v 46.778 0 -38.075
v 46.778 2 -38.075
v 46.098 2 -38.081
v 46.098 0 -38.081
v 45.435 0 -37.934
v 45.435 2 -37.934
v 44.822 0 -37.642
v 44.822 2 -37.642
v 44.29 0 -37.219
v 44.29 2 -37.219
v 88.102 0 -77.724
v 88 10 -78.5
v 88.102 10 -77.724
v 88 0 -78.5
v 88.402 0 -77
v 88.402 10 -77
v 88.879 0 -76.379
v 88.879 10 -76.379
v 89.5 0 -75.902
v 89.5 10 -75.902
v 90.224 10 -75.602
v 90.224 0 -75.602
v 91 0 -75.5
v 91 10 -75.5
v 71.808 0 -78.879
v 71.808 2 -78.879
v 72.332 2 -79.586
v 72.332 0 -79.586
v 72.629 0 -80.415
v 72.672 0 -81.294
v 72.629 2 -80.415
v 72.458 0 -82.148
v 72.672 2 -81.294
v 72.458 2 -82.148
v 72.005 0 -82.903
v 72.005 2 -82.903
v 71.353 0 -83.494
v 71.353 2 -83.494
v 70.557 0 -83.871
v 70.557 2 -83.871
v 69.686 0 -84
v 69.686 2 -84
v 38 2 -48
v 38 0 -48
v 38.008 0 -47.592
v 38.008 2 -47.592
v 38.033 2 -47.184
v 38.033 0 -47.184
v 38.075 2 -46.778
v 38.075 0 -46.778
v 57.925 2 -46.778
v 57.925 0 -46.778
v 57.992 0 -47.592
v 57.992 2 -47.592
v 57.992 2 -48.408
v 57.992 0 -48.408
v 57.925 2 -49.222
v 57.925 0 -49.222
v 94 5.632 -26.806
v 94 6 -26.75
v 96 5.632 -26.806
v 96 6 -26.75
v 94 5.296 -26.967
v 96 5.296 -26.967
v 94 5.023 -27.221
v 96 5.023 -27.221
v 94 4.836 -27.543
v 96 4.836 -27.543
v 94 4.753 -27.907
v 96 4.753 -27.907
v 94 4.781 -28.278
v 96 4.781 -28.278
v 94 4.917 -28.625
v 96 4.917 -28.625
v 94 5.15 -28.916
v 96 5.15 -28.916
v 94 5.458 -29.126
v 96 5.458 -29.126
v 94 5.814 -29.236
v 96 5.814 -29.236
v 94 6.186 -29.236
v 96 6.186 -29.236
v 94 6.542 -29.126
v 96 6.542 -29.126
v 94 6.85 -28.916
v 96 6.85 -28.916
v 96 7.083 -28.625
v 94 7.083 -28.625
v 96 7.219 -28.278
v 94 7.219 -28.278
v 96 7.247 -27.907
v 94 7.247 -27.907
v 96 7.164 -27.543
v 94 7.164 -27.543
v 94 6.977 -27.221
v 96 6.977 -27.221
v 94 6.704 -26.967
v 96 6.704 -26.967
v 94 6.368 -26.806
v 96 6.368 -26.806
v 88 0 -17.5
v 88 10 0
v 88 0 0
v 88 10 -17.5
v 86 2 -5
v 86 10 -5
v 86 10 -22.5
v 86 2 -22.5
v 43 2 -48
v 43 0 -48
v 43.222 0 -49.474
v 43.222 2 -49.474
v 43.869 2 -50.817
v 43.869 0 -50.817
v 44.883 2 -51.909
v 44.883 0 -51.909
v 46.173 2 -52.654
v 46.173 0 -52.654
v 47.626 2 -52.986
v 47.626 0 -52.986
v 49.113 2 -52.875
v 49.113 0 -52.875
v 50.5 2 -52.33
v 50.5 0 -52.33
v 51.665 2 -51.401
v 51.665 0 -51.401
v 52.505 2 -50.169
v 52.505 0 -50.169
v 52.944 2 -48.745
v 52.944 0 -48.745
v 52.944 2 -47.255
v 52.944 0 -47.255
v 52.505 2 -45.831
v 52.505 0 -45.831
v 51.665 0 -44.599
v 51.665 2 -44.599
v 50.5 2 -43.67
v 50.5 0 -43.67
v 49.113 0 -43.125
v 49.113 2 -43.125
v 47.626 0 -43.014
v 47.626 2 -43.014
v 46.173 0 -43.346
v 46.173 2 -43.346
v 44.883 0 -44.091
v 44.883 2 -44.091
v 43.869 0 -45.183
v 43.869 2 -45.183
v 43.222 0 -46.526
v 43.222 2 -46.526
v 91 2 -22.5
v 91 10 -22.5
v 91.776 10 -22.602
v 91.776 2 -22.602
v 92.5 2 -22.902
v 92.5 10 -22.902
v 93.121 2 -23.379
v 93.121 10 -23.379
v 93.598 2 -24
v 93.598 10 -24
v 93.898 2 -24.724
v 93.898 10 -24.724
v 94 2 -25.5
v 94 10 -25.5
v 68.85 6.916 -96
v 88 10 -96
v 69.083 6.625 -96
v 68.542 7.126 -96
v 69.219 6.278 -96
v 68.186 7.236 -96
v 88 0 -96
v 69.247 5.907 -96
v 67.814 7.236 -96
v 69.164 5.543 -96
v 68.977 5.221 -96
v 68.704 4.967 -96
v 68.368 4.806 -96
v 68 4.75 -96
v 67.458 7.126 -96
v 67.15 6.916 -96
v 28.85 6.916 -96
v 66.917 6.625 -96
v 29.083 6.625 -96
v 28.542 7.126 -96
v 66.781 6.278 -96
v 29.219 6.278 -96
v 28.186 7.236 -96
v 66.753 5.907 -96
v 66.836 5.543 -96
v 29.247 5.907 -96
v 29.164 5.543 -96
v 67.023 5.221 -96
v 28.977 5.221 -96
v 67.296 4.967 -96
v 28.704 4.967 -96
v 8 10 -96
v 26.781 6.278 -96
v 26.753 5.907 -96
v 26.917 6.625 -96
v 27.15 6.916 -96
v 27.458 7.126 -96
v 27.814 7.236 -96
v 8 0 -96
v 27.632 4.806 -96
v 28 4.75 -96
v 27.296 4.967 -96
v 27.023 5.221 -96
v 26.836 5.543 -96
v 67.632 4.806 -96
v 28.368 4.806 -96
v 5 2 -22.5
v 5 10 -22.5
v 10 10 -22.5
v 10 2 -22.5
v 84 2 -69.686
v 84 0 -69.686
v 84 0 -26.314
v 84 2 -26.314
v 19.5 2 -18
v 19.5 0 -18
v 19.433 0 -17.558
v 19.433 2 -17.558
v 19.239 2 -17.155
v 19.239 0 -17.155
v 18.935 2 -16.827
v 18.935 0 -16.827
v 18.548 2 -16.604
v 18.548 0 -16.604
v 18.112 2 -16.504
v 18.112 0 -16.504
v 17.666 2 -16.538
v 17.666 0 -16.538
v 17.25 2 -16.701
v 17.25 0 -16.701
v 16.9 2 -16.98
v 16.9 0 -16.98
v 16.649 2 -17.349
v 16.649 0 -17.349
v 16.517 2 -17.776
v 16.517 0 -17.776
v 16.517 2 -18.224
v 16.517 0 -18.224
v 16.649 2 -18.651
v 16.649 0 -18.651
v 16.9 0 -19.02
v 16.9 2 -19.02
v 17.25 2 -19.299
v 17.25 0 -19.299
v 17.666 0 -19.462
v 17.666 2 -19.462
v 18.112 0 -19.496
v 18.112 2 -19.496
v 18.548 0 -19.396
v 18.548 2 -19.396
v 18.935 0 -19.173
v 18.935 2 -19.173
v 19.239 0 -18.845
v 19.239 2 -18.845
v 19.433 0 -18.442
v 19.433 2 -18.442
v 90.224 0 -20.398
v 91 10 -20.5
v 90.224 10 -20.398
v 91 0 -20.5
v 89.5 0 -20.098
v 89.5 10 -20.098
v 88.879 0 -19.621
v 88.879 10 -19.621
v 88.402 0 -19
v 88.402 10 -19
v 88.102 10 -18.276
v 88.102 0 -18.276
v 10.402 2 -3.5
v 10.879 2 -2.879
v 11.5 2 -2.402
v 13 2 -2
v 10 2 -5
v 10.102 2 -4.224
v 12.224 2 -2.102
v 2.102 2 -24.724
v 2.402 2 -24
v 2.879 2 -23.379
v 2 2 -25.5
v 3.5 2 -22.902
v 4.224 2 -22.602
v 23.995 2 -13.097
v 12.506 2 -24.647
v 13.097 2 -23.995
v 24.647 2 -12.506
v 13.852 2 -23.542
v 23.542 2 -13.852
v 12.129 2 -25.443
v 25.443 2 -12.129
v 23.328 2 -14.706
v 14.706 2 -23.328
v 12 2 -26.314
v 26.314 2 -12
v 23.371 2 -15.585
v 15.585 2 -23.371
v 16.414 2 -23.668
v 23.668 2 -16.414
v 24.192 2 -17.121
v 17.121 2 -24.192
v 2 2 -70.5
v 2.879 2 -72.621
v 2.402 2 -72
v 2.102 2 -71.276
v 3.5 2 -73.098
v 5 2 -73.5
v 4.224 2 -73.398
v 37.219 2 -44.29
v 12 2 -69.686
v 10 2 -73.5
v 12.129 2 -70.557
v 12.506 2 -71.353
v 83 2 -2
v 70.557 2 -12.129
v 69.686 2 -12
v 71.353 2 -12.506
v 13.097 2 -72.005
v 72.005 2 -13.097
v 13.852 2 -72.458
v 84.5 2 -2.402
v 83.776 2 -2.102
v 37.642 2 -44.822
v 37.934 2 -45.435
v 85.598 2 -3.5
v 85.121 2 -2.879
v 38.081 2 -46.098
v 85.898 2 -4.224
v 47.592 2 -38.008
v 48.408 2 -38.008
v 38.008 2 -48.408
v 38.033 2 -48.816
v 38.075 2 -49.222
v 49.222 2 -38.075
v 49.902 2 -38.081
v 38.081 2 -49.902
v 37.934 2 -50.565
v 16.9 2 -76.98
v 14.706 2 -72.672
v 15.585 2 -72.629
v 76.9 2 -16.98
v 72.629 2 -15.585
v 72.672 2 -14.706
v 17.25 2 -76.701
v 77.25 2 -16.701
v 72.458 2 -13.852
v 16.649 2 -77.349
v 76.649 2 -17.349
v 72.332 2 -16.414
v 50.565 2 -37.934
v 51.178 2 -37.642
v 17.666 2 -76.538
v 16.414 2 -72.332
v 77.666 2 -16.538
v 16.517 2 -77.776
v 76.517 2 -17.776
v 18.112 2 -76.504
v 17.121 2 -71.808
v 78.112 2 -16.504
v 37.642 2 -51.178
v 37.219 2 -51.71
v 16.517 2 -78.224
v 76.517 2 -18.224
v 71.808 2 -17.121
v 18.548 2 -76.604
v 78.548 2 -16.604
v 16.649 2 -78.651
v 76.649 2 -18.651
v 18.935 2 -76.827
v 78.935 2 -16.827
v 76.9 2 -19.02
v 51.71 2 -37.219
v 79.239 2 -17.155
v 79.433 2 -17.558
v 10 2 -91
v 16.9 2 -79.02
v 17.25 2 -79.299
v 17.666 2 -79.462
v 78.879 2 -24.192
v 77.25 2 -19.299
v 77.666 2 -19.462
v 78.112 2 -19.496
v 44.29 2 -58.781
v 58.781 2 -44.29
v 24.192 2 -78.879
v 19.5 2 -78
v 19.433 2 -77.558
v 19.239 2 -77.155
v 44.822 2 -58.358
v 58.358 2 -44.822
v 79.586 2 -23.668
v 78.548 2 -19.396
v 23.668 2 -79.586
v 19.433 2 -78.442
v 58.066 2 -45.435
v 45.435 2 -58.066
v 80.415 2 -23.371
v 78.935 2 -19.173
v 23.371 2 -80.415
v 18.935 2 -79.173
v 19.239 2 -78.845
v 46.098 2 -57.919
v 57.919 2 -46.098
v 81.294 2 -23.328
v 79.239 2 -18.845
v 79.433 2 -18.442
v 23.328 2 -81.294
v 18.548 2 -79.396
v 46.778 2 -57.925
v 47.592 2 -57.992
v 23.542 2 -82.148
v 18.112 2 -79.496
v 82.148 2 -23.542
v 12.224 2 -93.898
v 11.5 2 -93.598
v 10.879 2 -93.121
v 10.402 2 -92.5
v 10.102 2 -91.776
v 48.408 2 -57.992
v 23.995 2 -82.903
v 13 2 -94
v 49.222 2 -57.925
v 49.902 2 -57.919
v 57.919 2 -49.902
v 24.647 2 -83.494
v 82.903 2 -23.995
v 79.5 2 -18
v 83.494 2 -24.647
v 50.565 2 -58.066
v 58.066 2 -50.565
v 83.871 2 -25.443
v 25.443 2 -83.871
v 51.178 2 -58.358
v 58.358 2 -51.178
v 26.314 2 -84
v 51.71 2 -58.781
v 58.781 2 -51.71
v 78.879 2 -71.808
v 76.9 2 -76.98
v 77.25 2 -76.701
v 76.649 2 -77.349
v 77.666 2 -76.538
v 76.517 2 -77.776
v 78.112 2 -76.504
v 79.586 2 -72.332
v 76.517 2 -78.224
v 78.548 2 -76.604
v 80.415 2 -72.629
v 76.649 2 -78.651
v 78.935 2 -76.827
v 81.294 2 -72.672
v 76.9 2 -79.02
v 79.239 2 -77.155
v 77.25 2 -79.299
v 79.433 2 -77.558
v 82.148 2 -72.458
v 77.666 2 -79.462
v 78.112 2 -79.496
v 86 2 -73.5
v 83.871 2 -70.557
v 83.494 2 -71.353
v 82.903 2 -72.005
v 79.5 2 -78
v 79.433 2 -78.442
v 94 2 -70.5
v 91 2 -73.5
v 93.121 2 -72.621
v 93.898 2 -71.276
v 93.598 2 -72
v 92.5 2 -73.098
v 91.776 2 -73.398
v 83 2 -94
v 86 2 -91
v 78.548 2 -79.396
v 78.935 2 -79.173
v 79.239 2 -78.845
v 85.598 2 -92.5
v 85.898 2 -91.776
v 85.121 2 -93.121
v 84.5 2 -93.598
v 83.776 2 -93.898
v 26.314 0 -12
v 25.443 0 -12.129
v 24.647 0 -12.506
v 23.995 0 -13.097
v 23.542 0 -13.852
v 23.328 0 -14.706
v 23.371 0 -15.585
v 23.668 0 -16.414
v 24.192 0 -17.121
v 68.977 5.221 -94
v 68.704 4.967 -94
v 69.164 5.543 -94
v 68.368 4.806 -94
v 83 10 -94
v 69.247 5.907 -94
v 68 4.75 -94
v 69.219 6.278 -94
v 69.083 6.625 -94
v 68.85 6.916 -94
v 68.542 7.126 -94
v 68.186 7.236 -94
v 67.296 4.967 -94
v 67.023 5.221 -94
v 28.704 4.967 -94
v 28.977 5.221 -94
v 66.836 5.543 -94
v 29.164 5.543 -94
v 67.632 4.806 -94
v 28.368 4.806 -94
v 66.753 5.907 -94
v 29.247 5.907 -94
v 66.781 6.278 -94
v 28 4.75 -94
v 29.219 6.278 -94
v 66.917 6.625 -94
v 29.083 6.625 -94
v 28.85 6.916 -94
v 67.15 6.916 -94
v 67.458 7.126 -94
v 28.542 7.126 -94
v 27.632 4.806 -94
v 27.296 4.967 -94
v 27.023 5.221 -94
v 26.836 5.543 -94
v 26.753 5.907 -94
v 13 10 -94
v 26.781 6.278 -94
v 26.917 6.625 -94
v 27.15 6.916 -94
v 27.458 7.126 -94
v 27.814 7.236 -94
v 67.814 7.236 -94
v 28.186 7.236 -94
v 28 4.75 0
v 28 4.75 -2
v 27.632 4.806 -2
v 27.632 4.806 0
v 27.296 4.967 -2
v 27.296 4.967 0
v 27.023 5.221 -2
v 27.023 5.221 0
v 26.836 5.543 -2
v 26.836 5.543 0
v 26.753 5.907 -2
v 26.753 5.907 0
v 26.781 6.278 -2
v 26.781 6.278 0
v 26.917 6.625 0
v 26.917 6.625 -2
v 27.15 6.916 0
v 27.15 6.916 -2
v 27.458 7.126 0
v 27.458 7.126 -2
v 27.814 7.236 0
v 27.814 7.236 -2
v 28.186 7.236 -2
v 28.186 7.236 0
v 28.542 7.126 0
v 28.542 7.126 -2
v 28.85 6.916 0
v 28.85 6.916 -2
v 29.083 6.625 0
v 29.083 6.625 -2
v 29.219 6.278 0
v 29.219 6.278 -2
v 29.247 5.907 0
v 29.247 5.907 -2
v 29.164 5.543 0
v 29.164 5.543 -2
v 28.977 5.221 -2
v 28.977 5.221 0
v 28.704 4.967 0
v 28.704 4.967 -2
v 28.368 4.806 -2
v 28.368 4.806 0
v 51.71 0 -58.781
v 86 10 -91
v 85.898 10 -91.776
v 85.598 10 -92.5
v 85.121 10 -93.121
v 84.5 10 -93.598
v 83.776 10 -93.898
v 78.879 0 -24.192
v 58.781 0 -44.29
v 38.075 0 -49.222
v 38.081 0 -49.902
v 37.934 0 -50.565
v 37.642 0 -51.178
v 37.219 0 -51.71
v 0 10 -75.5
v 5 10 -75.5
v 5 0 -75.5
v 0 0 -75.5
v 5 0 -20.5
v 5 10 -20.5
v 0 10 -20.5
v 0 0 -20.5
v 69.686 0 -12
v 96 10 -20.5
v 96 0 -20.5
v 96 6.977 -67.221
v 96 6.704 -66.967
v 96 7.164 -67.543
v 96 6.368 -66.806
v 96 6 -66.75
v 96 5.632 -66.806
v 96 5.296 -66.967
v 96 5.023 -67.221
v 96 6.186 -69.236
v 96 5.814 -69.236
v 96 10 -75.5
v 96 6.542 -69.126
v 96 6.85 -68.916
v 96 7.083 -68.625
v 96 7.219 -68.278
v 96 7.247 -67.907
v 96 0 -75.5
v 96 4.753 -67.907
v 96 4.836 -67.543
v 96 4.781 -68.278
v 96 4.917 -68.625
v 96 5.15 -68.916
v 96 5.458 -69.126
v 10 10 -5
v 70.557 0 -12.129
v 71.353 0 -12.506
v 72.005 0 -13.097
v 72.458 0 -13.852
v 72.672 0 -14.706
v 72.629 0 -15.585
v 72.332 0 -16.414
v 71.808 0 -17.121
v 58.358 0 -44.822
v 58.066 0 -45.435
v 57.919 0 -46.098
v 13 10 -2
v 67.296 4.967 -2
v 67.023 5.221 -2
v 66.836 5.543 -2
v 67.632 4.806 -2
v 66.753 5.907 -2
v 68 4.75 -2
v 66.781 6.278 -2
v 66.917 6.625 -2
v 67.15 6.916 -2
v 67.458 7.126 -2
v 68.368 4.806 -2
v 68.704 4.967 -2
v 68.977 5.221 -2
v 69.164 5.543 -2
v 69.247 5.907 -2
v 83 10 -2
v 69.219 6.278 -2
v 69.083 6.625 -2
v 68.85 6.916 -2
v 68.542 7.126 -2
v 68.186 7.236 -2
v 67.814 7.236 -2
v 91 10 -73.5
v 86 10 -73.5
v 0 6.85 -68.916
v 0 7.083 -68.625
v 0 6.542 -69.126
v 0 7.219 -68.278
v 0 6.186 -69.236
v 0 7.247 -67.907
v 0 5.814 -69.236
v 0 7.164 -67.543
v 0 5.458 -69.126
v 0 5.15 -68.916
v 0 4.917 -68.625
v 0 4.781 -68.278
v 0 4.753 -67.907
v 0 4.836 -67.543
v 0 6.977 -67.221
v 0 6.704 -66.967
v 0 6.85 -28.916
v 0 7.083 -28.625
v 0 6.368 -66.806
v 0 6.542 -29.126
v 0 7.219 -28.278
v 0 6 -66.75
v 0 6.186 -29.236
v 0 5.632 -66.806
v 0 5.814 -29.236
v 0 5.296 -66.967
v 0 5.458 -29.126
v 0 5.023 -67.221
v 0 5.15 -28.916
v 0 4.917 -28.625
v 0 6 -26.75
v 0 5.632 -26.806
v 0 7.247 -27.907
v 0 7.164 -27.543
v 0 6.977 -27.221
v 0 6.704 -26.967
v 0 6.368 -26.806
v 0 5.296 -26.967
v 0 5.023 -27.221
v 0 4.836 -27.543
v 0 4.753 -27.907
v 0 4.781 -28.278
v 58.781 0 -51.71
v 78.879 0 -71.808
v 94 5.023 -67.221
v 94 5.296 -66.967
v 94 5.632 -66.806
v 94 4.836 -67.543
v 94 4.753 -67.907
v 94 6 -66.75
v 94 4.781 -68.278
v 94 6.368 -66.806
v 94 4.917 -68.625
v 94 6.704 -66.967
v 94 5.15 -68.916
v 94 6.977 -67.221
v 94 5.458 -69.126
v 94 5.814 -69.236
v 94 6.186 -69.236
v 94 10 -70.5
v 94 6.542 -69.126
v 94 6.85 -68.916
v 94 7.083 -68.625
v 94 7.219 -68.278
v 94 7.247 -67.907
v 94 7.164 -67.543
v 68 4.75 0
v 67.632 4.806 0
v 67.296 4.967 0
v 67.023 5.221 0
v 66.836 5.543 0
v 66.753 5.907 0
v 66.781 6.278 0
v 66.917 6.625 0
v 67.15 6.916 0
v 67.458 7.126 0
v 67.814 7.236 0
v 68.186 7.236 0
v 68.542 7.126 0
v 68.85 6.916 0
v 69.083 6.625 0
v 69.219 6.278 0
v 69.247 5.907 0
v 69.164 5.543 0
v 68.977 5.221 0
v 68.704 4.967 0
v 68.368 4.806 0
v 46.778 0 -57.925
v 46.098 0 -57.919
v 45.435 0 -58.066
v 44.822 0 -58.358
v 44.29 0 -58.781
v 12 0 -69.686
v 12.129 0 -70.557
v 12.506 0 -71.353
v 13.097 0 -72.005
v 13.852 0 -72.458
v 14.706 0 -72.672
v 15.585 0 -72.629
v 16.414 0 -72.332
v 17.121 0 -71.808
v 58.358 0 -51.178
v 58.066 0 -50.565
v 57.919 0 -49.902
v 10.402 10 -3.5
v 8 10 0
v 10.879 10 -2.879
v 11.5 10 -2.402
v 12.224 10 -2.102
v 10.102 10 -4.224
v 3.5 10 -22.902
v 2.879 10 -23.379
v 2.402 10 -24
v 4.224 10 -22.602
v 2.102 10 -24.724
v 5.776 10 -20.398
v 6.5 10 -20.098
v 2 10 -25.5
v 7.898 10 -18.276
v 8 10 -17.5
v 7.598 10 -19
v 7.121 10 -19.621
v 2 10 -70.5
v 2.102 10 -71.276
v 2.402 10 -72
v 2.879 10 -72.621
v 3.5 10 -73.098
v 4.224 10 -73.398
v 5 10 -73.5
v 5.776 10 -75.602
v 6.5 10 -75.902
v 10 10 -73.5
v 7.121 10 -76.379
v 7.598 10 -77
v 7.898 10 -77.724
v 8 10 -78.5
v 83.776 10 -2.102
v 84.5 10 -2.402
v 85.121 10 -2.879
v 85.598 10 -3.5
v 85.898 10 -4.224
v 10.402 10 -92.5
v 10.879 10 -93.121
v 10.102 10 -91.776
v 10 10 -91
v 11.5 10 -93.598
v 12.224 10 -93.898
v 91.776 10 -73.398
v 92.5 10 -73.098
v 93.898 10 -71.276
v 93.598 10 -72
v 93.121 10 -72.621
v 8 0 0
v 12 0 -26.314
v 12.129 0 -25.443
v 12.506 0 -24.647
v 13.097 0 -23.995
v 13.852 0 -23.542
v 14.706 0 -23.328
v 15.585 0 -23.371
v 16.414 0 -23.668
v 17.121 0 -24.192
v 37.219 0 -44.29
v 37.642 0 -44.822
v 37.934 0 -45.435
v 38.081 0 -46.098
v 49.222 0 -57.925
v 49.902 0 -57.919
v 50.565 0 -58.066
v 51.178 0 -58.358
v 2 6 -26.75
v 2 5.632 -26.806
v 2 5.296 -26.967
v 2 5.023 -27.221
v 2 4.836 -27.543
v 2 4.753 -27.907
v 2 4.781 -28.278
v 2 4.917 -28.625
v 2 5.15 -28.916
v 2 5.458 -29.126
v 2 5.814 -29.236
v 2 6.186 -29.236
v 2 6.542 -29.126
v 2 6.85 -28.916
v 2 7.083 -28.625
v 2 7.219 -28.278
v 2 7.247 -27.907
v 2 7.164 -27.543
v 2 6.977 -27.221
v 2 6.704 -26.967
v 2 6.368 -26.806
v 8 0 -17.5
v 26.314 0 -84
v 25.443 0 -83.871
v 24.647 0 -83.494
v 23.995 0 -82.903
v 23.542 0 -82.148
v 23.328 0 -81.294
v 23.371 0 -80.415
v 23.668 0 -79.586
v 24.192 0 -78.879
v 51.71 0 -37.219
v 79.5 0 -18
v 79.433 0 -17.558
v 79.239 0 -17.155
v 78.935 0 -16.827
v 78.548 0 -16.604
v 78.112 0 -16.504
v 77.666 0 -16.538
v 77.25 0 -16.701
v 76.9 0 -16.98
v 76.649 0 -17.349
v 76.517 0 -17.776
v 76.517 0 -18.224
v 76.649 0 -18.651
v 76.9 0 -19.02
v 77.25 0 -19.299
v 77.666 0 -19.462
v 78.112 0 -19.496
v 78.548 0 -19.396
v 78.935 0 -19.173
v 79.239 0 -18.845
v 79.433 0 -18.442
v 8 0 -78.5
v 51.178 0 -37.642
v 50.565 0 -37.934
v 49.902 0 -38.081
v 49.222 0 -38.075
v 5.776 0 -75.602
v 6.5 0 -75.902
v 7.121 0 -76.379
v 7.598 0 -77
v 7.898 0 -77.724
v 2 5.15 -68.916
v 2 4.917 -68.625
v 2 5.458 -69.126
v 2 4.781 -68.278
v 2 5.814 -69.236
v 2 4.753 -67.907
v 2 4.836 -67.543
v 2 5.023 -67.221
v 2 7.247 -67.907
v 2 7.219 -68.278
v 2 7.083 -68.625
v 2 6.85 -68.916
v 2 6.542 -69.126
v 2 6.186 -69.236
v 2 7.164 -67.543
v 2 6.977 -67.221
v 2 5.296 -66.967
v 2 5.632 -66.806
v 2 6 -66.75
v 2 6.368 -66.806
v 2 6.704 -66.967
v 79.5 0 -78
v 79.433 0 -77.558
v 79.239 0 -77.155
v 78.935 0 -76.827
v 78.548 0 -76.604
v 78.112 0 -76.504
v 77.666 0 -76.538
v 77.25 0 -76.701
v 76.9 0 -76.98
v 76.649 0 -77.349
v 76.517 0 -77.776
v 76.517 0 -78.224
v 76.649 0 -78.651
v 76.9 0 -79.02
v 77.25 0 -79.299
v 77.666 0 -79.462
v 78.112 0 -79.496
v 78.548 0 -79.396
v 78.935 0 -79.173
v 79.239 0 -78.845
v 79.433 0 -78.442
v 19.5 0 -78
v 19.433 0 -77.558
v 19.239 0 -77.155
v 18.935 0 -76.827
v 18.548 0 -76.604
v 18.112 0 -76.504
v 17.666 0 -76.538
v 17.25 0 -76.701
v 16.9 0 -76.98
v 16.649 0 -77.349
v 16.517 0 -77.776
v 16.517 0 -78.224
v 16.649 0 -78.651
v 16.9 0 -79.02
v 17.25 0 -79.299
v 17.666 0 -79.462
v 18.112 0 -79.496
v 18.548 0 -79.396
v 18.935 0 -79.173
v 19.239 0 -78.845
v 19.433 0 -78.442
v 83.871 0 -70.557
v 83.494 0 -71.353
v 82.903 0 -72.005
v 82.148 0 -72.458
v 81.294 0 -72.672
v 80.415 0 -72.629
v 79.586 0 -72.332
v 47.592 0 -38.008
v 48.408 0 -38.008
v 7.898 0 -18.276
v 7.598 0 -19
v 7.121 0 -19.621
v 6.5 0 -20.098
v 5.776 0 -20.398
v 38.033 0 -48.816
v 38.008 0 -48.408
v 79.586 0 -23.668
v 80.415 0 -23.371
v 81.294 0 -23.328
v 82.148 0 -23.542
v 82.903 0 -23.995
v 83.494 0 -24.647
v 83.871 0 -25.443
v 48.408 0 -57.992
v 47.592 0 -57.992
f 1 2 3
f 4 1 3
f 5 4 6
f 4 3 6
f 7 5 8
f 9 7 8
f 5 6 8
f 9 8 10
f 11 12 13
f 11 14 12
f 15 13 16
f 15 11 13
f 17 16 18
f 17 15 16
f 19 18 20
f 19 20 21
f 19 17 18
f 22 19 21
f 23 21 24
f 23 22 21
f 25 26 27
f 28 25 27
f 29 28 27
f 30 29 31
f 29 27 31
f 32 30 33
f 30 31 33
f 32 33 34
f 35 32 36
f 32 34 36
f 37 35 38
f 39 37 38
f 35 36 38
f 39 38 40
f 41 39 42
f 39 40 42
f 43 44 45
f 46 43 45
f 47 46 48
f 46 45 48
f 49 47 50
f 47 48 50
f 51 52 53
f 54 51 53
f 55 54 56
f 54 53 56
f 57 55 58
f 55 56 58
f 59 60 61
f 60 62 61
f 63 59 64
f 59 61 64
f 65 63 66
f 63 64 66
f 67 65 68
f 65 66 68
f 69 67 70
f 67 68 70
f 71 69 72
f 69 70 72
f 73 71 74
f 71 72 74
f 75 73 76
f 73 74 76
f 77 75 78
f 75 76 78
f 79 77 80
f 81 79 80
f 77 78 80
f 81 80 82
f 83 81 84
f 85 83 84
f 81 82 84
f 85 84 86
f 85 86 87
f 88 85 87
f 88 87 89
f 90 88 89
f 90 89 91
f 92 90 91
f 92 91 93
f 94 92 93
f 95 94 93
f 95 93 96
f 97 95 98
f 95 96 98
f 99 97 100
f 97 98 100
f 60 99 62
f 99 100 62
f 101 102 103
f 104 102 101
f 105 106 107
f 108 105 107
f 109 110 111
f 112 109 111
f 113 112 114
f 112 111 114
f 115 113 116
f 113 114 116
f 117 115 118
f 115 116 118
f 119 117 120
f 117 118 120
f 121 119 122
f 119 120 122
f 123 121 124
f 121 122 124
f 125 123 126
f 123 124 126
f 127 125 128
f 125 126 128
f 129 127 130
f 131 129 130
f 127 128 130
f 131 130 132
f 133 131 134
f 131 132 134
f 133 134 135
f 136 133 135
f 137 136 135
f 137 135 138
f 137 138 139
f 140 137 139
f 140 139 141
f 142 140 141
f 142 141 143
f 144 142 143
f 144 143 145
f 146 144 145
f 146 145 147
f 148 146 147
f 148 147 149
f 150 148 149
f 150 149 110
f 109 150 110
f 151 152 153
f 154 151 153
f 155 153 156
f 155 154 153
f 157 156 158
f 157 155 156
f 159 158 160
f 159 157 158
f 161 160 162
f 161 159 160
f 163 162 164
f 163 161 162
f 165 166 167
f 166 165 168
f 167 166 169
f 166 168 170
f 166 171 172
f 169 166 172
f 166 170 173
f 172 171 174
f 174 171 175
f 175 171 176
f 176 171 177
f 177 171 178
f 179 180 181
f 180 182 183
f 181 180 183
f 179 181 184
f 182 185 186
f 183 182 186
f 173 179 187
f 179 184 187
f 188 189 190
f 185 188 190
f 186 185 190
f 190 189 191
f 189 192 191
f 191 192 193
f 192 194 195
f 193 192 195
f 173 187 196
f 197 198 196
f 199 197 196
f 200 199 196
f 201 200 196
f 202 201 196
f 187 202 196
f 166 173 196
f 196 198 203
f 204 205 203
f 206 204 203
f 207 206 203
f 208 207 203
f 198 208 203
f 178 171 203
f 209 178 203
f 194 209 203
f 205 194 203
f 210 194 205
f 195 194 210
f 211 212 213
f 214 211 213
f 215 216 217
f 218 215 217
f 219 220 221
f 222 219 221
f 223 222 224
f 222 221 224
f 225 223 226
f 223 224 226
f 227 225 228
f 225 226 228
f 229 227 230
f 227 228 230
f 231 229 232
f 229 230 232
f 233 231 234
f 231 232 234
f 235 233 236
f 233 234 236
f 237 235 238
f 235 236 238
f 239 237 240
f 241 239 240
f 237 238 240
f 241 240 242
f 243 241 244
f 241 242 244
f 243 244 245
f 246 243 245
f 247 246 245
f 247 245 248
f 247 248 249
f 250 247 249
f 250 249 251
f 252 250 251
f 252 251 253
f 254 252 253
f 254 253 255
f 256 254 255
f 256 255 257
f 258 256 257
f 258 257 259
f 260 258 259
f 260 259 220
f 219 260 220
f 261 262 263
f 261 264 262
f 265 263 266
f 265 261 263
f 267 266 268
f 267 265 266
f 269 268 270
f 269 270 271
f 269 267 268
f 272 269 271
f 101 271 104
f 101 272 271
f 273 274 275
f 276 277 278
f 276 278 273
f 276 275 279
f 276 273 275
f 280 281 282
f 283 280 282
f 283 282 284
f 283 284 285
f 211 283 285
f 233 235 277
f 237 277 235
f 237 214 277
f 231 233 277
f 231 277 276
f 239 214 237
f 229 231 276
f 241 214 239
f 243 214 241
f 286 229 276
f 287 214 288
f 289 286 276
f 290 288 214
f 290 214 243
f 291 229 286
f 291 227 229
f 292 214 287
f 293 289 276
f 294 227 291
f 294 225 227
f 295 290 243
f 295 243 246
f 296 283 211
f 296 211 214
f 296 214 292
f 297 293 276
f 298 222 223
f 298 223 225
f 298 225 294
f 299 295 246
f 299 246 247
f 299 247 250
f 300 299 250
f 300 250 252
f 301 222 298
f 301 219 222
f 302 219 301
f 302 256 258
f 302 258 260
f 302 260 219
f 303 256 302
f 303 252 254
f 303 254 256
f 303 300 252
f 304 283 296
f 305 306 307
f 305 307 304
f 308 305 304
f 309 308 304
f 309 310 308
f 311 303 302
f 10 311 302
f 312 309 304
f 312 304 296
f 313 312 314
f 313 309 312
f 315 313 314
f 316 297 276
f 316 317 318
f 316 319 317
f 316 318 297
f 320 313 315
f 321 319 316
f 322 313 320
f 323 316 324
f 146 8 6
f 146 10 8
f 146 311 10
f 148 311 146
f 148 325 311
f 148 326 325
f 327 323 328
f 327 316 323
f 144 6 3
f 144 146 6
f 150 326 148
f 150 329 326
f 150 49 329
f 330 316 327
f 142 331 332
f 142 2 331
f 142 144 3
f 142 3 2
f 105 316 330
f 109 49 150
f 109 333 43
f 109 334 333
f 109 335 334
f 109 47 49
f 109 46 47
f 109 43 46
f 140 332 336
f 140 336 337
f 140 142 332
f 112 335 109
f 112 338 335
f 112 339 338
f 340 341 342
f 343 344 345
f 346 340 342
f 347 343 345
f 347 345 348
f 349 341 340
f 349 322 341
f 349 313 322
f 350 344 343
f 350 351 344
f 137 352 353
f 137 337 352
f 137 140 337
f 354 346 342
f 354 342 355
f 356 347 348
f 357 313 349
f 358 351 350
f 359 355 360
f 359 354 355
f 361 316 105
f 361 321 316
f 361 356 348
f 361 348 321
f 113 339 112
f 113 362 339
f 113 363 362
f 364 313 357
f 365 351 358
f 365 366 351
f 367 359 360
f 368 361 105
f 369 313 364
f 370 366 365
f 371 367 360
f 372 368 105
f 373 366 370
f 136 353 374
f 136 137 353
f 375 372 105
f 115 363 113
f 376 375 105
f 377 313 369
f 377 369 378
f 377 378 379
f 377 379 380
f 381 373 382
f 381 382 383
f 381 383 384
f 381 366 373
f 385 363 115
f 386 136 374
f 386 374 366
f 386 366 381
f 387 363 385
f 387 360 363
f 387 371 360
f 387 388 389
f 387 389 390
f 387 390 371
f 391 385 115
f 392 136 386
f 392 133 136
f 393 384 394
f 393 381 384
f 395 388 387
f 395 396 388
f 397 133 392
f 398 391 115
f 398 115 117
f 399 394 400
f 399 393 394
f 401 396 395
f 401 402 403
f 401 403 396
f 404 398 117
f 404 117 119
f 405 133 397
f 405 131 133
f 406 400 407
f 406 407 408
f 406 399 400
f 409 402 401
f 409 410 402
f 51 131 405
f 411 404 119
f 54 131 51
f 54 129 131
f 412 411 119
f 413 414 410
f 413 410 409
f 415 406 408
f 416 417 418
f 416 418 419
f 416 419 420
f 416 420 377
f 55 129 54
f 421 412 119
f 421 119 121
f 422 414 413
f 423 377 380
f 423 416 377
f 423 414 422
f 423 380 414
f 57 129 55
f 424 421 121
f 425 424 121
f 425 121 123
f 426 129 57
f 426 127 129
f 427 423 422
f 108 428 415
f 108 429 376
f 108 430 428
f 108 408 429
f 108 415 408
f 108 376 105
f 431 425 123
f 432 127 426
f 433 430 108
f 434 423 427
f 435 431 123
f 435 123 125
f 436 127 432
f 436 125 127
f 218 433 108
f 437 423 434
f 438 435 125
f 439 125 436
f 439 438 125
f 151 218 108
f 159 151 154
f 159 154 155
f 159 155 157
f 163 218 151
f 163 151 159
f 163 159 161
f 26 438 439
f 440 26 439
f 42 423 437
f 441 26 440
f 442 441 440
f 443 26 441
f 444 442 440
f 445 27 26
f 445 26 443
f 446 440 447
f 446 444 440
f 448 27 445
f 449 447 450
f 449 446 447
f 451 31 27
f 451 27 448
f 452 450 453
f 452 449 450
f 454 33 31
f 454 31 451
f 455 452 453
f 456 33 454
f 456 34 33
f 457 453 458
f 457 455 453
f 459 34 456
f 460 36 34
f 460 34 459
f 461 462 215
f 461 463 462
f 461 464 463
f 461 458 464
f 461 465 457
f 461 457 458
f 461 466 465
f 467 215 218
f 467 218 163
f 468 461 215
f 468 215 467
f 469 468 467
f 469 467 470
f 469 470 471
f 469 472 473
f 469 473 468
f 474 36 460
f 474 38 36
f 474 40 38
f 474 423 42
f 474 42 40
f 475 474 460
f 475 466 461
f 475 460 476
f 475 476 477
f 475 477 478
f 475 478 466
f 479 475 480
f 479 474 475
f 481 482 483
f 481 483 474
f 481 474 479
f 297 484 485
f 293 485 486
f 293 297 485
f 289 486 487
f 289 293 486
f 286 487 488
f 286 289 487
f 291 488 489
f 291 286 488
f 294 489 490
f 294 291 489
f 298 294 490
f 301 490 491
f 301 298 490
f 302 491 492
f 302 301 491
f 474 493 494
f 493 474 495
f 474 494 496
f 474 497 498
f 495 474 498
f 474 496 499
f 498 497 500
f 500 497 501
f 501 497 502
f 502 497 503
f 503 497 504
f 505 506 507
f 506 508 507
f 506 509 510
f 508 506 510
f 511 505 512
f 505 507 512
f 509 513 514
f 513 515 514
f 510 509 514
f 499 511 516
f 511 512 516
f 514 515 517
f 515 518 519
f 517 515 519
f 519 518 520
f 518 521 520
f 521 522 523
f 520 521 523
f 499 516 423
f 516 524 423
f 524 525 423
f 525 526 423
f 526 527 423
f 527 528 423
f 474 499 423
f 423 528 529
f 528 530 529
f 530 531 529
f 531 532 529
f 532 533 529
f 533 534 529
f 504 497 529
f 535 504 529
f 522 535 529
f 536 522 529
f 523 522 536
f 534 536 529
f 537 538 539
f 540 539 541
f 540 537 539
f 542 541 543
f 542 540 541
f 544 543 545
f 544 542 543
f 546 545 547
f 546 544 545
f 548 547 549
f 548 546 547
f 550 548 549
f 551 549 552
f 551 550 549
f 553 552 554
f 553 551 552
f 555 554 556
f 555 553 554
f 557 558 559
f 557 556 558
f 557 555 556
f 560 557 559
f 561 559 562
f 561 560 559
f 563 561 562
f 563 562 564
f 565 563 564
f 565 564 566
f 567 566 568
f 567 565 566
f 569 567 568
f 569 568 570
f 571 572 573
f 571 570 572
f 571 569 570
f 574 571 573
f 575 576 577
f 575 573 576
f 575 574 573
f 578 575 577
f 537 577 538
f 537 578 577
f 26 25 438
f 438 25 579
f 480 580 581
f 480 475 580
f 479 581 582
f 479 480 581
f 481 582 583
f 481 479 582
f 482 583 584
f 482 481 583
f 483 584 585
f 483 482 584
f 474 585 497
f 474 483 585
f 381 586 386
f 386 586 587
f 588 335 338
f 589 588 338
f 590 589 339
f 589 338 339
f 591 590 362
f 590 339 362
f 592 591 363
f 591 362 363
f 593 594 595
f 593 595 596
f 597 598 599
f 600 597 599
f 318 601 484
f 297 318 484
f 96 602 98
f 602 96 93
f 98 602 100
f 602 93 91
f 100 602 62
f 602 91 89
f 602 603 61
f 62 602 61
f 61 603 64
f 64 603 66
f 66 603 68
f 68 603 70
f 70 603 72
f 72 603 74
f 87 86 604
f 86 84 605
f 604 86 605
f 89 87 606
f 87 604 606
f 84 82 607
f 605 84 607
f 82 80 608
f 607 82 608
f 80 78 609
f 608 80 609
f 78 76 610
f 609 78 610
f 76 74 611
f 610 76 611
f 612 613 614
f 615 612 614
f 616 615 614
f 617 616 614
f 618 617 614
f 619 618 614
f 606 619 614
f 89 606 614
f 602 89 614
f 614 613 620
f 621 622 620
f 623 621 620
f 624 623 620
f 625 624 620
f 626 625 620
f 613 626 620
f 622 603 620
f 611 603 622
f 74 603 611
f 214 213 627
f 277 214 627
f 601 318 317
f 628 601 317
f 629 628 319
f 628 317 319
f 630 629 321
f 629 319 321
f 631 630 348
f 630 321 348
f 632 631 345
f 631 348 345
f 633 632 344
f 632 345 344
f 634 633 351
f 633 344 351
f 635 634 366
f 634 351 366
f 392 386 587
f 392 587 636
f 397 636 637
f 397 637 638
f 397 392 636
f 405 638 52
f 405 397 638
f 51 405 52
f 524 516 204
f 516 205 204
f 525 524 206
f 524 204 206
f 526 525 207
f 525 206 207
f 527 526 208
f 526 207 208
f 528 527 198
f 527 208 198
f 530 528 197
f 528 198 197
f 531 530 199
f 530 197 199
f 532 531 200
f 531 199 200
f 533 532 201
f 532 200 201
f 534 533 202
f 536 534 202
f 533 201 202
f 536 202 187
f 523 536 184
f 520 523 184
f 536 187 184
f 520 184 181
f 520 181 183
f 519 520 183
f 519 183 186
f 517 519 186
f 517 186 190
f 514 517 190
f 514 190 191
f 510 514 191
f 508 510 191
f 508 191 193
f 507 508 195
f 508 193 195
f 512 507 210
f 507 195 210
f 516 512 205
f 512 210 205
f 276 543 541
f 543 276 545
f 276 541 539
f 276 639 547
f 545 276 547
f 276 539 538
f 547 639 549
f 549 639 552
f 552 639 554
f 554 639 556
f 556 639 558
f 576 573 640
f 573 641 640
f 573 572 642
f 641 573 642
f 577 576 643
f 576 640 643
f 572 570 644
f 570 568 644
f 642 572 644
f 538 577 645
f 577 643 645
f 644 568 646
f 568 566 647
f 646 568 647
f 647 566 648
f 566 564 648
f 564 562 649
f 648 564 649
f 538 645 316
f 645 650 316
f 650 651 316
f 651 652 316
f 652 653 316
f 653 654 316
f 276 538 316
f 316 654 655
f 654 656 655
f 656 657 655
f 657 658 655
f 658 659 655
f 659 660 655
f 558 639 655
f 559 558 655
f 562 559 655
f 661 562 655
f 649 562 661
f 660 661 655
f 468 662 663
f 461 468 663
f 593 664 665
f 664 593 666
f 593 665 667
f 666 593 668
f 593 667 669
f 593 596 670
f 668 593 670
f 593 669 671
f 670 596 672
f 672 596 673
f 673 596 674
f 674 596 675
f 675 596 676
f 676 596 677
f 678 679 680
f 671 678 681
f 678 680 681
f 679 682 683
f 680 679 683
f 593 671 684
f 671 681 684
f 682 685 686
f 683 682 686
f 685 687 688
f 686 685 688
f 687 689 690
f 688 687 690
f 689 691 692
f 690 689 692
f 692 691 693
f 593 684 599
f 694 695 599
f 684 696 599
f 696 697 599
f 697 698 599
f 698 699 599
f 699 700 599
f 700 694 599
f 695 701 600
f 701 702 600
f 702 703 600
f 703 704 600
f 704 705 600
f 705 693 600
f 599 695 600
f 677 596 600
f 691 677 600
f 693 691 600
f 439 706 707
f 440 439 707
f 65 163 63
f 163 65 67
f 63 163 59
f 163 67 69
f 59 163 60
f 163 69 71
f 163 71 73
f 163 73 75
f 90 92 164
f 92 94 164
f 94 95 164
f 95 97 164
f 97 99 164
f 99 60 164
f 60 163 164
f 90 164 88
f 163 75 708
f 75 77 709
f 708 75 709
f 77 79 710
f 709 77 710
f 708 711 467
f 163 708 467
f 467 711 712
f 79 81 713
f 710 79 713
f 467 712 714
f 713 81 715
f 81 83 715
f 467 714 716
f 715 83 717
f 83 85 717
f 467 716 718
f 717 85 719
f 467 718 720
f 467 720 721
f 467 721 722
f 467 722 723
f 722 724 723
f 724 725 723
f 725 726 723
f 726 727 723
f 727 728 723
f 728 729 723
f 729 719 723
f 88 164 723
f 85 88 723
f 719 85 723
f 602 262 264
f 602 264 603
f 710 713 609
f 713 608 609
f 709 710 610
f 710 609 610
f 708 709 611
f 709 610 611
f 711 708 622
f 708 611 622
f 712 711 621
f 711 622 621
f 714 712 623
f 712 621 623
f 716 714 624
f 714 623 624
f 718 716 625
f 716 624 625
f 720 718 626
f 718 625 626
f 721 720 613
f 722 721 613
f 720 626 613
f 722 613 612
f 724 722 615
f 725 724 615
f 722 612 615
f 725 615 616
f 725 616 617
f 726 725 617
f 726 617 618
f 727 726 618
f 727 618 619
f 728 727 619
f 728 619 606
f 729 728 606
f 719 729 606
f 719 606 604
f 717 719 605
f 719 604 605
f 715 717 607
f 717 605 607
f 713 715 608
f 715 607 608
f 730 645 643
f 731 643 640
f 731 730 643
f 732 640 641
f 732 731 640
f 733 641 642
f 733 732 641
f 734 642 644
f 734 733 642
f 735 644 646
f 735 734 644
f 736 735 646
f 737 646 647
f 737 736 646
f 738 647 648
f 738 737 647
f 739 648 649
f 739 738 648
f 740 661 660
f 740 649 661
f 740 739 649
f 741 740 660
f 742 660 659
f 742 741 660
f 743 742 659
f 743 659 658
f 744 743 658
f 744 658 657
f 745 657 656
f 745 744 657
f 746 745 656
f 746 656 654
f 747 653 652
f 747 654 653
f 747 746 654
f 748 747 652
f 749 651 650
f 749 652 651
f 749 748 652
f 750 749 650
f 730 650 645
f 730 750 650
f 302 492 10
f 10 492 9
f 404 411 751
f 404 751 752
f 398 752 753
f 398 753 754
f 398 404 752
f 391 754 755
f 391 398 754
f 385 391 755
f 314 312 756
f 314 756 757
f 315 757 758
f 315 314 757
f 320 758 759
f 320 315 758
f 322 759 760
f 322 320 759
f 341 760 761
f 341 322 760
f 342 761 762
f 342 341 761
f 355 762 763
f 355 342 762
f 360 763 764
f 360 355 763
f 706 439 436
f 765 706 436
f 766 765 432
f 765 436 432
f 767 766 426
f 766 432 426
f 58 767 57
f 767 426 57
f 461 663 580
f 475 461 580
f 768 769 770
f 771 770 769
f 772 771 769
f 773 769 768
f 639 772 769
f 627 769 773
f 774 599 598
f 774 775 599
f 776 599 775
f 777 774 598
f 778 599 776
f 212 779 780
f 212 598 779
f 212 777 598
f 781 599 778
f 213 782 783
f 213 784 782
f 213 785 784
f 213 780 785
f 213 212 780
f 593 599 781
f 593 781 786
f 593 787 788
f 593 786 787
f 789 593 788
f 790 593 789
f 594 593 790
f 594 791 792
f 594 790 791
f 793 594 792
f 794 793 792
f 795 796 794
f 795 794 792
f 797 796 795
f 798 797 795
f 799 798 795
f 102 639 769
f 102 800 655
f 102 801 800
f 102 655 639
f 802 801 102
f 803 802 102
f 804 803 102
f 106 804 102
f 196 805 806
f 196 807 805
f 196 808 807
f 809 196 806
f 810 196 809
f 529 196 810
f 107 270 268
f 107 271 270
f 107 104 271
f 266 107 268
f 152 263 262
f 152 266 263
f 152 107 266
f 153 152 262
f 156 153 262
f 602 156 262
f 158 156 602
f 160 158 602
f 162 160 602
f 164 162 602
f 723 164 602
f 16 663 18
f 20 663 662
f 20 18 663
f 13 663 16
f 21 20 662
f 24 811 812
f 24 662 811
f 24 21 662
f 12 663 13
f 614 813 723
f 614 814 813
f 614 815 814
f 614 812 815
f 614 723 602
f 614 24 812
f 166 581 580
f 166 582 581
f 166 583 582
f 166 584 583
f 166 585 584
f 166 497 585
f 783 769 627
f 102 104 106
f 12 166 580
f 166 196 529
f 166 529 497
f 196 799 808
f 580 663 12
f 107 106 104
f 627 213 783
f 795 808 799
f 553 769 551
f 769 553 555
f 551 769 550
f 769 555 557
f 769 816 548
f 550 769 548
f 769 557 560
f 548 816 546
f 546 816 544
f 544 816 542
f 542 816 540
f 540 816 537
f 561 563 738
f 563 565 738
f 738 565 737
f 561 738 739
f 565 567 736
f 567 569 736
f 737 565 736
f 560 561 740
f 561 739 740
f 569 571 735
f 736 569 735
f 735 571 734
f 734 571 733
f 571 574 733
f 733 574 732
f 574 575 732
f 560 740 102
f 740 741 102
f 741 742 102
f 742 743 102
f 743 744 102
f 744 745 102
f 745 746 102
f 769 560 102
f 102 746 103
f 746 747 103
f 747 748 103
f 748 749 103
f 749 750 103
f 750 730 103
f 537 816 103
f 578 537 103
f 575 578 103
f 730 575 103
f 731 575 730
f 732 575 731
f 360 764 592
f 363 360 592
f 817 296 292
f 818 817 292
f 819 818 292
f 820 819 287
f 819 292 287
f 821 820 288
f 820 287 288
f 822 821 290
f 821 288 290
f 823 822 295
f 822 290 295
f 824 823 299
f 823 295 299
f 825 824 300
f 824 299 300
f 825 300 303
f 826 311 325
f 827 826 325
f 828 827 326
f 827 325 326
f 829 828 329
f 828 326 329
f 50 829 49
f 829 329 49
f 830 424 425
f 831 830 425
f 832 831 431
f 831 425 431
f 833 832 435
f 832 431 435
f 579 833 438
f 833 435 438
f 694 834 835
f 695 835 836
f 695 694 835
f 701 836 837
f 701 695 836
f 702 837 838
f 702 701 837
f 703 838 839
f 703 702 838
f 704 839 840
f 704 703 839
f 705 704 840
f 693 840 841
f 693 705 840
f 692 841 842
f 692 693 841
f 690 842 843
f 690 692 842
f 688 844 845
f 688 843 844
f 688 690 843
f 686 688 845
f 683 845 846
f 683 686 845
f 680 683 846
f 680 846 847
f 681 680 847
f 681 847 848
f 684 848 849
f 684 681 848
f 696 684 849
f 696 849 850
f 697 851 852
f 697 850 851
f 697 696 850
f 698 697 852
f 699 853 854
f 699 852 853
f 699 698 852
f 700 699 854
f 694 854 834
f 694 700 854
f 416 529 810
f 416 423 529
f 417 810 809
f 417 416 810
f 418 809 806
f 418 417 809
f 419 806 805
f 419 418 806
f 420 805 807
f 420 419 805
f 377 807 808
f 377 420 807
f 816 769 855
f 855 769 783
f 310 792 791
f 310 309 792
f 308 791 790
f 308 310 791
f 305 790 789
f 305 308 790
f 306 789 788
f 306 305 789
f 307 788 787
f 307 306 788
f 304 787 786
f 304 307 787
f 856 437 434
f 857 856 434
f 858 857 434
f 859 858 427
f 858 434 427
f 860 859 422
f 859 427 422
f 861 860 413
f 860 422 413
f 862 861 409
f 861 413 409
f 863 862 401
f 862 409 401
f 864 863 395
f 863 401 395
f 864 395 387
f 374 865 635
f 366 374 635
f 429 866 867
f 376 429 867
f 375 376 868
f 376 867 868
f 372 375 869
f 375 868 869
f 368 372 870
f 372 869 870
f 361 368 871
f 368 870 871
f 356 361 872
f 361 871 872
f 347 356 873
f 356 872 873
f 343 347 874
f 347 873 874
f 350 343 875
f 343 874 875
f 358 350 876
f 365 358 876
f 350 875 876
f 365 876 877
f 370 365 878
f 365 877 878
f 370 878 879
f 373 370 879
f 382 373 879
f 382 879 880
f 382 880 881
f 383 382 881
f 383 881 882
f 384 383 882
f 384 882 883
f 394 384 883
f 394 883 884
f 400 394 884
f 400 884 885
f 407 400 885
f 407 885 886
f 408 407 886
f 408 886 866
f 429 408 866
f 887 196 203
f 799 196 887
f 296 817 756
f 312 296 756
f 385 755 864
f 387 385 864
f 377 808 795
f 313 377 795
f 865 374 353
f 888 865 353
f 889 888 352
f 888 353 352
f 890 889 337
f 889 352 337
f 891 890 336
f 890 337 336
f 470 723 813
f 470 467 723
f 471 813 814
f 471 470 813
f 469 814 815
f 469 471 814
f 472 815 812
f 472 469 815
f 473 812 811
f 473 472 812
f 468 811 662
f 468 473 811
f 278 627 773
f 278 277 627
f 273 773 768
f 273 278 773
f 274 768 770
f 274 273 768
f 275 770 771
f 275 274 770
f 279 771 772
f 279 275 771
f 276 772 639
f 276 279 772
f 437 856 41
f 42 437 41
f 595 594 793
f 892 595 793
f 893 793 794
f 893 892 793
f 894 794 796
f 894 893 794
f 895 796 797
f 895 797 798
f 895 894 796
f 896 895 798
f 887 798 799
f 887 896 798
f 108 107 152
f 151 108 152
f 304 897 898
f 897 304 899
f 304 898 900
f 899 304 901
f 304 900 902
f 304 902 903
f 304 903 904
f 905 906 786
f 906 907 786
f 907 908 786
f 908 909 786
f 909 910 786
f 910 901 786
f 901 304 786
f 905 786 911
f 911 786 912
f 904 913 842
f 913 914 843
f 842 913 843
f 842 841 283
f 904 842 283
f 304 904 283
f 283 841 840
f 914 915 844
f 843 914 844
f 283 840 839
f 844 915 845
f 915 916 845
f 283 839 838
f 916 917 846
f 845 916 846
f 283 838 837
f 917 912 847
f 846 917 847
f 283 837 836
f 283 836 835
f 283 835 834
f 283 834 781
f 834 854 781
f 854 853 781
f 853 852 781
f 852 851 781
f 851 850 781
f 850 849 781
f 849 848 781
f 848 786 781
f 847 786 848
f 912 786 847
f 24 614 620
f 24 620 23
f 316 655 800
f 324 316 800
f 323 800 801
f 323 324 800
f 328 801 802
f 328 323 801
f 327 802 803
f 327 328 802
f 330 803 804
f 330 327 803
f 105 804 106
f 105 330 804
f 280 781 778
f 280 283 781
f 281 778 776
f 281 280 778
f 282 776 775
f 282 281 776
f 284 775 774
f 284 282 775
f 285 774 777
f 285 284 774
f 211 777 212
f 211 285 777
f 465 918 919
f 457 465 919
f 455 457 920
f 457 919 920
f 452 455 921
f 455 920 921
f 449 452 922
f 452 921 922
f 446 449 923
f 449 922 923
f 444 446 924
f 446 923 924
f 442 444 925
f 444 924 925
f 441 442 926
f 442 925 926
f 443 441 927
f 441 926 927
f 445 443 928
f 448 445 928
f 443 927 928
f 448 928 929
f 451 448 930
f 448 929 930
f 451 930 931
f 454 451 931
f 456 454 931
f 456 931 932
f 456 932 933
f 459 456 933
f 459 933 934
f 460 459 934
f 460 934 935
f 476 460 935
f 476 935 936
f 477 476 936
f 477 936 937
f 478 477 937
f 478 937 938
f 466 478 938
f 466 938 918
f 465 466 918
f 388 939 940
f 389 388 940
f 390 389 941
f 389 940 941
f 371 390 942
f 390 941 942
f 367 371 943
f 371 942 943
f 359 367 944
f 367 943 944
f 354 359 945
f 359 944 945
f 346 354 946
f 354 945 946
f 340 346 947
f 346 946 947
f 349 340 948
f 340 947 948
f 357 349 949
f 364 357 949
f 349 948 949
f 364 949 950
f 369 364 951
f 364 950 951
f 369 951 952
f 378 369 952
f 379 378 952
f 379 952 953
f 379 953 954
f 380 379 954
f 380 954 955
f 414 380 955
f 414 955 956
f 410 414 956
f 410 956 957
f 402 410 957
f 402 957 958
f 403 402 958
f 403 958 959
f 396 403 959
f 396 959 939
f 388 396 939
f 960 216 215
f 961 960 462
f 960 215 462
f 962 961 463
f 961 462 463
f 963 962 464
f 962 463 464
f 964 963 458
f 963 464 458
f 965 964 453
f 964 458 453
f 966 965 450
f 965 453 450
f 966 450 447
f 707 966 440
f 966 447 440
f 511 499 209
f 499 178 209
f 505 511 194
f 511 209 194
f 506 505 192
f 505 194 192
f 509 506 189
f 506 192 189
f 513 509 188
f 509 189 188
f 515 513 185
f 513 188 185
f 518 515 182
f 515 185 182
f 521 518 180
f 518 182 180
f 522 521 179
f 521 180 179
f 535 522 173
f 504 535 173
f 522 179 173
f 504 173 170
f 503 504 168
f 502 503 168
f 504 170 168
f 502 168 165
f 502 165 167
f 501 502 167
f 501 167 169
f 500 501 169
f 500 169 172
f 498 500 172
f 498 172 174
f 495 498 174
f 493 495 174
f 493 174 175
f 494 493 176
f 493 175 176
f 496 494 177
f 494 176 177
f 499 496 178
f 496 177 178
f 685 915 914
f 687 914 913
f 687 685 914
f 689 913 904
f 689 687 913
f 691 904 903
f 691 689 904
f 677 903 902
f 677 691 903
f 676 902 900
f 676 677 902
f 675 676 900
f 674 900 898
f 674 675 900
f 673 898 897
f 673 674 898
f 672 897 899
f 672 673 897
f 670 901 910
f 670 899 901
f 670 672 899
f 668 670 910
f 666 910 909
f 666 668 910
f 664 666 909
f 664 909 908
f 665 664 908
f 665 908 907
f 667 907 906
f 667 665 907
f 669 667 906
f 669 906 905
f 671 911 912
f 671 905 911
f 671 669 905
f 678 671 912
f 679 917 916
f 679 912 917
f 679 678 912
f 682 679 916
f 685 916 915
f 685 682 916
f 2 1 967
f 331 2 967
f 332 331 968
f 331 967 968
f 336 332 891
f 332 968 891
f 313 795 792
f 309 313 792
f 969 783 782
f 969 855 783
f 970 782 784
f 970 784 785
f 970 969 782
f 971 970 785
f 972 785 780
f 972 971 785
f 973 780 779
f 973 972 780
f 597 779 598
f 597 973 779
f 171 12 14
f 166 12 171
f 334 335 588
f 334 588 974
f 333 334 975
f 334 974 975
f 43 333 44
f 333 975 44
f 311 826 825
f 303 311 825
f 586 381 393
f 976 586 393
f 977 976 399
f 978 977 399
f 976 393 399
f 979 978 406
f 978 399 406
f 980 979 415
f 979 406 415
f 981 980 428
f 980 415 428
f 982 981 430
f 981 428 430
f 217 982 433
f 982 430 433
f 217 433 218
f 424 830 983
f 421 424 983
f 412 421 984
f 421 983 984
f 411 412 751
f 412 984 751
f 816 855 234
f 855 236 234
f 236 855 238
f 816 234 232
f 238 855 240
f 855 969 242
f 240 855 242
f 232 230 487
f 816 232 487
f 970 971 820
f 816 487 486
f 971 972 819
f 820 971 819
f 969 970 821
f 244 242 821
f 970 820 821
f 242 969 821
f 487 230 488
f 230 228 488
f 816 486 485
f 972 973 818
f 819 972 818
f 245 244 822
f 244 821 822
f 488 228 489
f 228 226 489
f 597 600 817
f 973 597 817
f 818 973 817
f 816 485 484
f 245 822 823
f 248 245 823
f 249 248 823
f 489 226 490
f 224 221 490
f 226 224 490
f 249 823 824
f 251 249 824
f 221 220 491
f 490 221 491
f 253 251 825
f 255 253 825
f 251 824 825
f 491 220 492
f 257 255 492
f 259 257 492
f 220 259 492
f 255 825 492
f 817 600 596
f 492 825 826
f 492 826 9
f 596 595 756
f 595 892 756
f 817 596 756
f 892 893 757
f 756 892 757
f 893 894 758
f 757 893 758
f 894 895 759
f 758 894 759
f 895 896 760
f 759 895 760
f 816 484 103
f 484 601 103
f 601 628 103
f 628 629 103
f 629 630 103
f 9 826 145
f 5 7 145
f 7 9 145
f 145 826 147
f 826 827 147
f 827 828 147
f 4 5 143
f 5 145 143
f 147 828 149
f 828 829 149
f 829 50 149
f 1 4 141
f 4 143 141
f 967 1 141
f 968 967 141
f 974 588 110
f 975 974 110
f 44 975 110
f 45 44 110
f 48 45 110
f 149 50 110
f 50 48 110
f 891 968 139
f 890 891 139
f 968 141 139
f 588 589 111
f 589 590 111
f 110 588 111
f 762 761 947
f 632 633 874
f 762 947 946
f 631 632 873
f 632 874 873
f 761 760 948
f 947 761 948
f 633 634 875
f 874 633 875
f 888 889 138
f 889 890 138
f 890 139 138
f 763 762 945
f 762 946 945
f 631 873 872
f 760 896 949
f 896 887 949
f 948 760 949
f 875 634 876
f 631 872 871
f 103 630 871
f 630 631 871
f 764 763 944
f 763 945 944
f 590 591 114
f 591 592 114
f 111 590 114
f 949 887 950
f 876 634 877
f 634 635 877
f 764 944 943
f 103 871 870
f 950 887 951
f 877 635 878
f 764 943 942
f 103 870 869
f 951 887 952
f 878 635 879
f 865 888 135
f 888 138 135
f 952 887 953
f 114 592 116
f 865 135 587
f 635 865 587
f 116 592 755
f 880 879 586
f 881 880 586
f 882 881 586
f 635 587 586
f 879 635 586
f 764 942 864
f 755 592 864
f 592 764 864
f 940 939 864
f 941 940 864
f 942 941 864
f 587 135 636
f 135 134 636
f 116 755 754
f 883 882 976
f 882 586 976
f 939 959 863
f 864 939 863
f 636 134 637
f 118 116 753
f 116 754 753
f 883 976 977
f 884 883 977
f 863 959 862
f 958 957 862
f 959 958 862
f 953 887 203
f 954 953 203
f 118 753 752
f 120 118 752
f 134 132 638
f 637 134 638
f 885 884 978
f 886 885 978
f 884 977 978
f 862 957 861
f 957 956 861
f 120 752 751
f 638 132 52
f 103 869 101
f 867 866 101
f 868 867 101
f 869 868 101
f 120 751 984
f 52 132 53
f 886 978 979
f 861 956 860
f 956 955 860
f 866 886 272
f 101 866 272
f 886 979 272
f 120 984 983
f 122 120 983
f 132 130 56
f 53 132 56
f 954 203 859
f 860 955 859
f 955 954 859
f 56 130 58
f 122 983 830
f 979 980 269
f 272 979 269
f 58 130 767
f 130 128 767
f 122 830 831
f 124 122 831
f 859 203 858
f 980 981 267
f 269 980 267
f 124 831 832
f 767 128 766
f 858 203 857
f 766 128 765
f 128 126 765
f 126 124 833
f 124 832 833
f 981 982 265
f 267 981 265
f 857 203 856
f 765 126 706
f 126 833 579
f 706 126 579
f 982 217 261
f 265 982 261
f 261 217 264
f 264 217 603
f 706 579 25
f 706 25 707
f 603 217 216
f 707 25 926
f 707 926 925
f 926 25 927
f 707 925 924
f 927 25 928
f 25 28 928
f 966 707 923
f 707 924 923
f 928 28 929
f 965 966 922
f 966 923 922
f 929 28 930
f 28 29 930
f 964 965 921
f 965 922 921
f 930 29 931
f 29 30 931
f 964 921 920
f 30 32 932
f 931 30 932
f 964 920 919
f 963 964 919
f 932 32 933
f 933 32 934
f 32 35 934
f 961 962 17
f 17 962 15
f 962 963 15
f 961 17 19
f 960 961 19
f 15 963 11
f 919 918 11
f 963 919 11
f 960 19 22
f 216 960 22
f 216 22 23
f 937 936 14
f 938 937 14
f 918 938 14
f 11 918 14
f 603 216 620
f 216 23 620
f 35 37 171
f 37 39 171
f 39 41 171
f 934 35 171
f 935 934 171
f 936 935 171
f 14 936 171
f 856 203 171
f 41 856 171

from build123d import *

# Parameters (mm, degrees)
BOSS_EXTRUDE1_DEPTH            = 10
SKETCH2_R                      = 5
CUT_EXTRUDE1_DEPTH             = 11
FILLET1_R                      = 3
CUT_EXTRUDE4_DEPTH             = 11
CUT_EXTRUDE5_DEPTH             = 8
FILLET2_R                      = 3
SKETCH7_R                      = 1.5
CUT_EXTRUDE6_DEPTH             = 10
M3X0_5_TAPPED_HOLE1_AT_2_COUNT = 2
M3X0_5_TAPPED_HOLE1_AT_2_PITCH = 40
M3X0_5_TAPPED_HOLE2_AT_2_COUNT = 2
M3X0_5_TAPPED_HOLE2_AT_2_PITCH = 40


with BuildPart() as part:
    # Sketch1 → Boss-Extrude1 (new body)
    with BuildSketch(Plane(origin=(0, 0, 0), x_dir=(1, 0, 0), z_dir=(0, 1, 0))):
        Polygon((0, 88), (0, 8), (8, 0), (88, 0), (96, 8), (96, 88), (88, 96), (8, 96), align=None)
    extrude(amount=BOSS_EXTRUDE1_DEPTH)

    # Sketch2 → Cut-Extrude1 (cut, through all)
    with BuildSketch(Plane(origin=(0, 0, 0), x_dir=(-1, 0, 0), z_dir=(0, -1, 0))):
        with BuildLine():
            Line((-45.411809549, 57.659258263), (-19.071067812, 84))
            Line((-19.071067812, 84), (-76.928932188, 84))
            Line((-76.928932188, 84), (-50.588190451, 57.659258263))
            ThreePointArc((-50.588190451, 57.659258263), (-48, 58), (-45.411809549, 57.659258263))
        make_face()
        with BuildLine():
            Line((-12, 76.928932188), (-38.340741737, 50.588190451))
            ThreePointArc((-38.340741737, 50.588190451), (-38.085551386, 49.305261922), (-38, 48))
            ThreePointArc((-38, 48), (-38.085551386, 46.694738078), (-38.340741737, 45.411809549))
            Line((-38.340741737, 45.411809549), (-12, 19.071067812))
            Line((-12, 19.071067812), (-12, 76.928932188))
        make_face()
        with BuildLine():
            Line((-19.071067812, 12), (-45.411809549, 38.340741737))
            ThreePointArc((-45.411809549, 38.340741737), (-48, 38), (-50.588190451, 38.340741737))
            Line((-50.588190451, 38.340741737), (-76.928932188, 12))
            Line((-76.928932188, 12), (-19.071067812, 12))
        make_face()
        with BuildLine():
            ThreePointArc((-57.659258263, 45.411809549), (-58, 48), (-57.659258263, 50.588190451))
            Line((-57.659258263, 50.588190451), (-84, 76.928932188))
            Line((-84, 76.928932188), (-84, 19.071067812))
            Line((-84, 19.071067812), (-57.659258263, 45.411809549))
        make_face()
        with Locations((-48, 48)):
            Circle(SKETCH2_R)
    extrude(amount=-CUT_EXTRUDE1_DEPTH, mode=Mode.SUBTRACT)

    # Fillet1
    fillet1_edges = [part.edges().sort_by_distance(p)[0] for p in [
        (50.588190451, 5, -38.340741737),
        (45.411809549, 5, -38.340741737),
        (19.071067812, 5, -12),
        (76.928932188, 5, -12),
        (38.340741737, 5, -45.411809549),
        (38.340741737, 5, -50.588190451),
        (12, 5, -76.928932188),
        (12, 5, -19.071067812),
        (57.659258263, 5, -50.588190451),
        (57.659258263, 5, -45.411809549),
        (84, 5, -19.071067812),
        (84, 5, -76.928932188),
        (45.411809549, 5, -57.659258263),
        (50.588190451, 5, -57.659258263),
        (76.928932188, 5, -84),
        (19.071067812, 5, -84),
    ]]
    fillet(fillet1_edges, radius=FILLET1_R)

    # Sketch5 → Cut-Extrude4 (cut, through all)
    with BuildSketch(Plane(origin=(0, 10, 0), x_dir=(1, 0, 0), z_dir=(0, 1, 0))):
        Polygon((8, 0), (8, 20.5), (0, 20.5), (0, 8), align=None)
        Polygon((96, 8), (88, 0), (88, 20.5), (96, 20.5), align=None)
        Polygon((96, 75.5), (88, 75.5), (88, 96), (96, 88), align=None)
        Polygon((8, 96), (8, 75.5), (0, 75.5), (0, 88), align=None)
    extrude(amount=-CUT_EXTRUDE4_DEPTH, mode=Mode.SUBTRACT)

    # Sketch6 → Cut-Extrude5 (cut)
    with BuildSketch(Plane(origin=(0, 10, 0), x_dir=(1, 0, 0), z_dir=(0, 1, 0))):
        Polygon((86, 73.5), (86, 94), (10, 94), (10, 73.5), (2, 73.5), (2, 22.5), (10, 22.5), (10, 2), (86, 2), (86, 22.5), (94, 22.5), (94, 73.5), align=None)
    extrude(amount=-CUT_EXTRUDE5_DEPTH, mode=Mode.SUBTRACT)

    # Fillet2
    fillet2_edges = [part.edges().sort_by_distance(p)[0] for p in [
        (8, 5, -75.5),
        (88, 5, -75.5),
        (88, 5, -20.5),
        (8, 5, -20.5),
        (94, 6, -73.5),
        (94, 6, -22.5),
        (86, 6, -2),
        (10, 6, -2),
        (2, 6, -22.5),
        (2, 6, -73.5),
        (10, 6, -94),
        (86, 6, -94),
    ]]
    fillet(fillet2_edges, radius=FILLET2_R)

    # Sketch7 → Cut-Extrude6 (cut)
    with BuildSketch(Plane.XZ):
        with Locations((78, -18)):
            Circle(SKETCH7_R)
        with Locations((18, -18)):
            Circle(SKETCH7_R)
        with Locations((18, -78)):
            Circle(SKETCH7_R)
        with Locations((78, -78)):
            Circle(SKETCH7_R)
    extrude(amount=-CUT_EXTRUDE6_DEPTH, mode=Mode.SUBTRACT)

    # Sketch13 → M3x0.5 Tapped Hole1 (revolve, cut)
    with BuildSketch(Plane(origin=(28, 6, 0), x_dir=(0, -1, 0), z_dir=(1, 0, 0))):
        Polygon((0, 0), (0, 8.251075774), (1.25, 7.5), (1.25, 0), align=None)
    m3x0_5_tapped_hole1 = revolve(axis=Axis((28, 6, 6.35), (0, 0, -1)), mode=Mode.SUBTRACT)

    # M3x0.5 Tapped Hole1 at 2: M3x0.5 Tapped Hole1 ×2
    with Locations(*[(i * M3X0_5_TAPPED_HOLE1_AT_2_PITCH, 0, 0) for i in range(1, M3X0_5_TAPPED_HOLE1_AT_2_COUNT)]):
        add(m3x0_5_tapped_hole1, mode=Mode.SUBTRACT)

    # Sketch15 → M3x0.5 Tapped Hole2 (revolve, cut)
    with BuildSketch(Plane(origin=(0, 6, -68), x_dir=(0, 0, 1), z_dir=(0, 1, 0))):
        Polygon((0, 0), (0, 8.251075774), (1.25, 7.5), (1.25, 0), align=None)
    m3x0_5_tapped_hole2 = revolve(axis=Axis((-6.35, 6, -68), (1, 0, 0)), mode=Mode.SUBTRACT)

    # M3x0.5 Tapped Hole2 at 2: M3x0.5 Tapped Hole2 ×2
    with Locations(*[(0, 0, i * M3X0_5_TAPPED_HOLE2_AT_2_PITCH) for i in range(1, M3X0_5_TAPPED_HOLE2_AT_2_COUNT)]):
        add(m3x0_5_tapped_hole2, mode=Mode.SUBTRACT)

    # Mirror1: M3x0.5 Tapped Hole1 across plane
    add(m3x0_5_tapped_hole1.mirror(Plane.XY.offset(-48)), mode=Mode.SUBTRACT)

    # Mirror1 copy 1 sketch → Mirror1 copy 1 (revolve, cut)
    with BuildSketch(Plane(origin=(68, 6, -96), x_dir=(0, -1, 0), z_dir=(1, 0, 0))):
        Polygon((0, 0), (0, -8.251075774), (1.25, -7.5), (1.25, 0), align=None)
    revolve(axis=Axis((68, 6, -102.35), (0, 0, -1)), mode=Mode.SUBTRACT)

    # Mirror2: M3x0.5 Tapped Hole2 across plane
    add(m3x0_5_tapped_hole2.mirror(Plane.ZY.offset(-48)), mode=Mode.SUBTRACT)

    # Mirror2 copy 1 sketch → Mirror2 copy 1 (revolve, cut)
    with BuildSketch(Plane(origin=(96, 6, -28), x_dir=(0, 0, 1), z_dir=(0, 1, 0))):
        Polygon((0, 0), (0, -8.251075774), (1.25, -7.5), (1.25, 0), align=None)
    revolve(axis=Axis((102.35, 6, -28), (1, 0, 0)), mode=Mode.SUBTRACT)


solid = part.part
